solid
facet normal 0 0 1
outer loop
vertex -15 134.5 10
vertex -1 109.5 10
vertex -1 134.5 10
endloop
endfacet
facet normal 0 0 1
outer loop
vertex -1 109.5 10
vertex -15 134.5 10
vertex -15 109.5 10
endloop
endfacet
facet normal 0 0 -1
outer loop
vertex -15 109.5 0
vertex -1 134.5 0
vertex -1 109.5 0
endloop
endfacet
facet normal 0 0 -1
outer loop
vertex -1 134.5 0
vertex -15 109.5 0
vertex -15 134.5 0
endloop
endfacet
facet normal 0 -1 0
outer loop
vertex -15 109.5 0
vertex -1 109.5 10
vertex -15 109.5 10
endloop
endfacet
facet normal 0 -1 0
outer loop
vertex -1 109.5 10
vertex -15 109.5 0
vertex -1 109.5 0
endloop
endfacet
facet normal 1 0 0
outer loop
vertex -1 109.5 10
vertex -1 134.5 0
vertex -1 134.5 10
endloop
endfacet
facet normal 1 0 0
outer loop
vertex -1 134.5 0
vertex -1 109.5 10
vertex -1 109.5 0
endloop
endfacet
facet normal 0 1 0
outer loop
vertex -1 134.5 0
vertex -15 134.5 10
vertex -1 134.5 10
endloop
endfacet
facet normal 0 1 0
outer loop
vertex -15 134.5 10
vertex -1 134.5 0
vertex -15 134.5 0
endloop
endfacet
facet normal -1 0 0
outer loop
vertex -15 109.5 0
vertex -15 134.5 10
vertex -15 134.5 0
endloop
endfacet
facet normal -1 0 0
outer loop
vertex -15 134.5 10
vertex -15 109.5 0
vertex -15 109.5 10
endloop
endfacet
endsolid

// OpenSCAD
// file: hub.scad
module hub(hubDiameter,hubHeight,hubSetScewDiameter)
	{
		if(hubSetScewDiameter == 0)
		{
			cylinder(h = hubHeight, r = hubDiameter/2, center =false);
		}
		if(hubSetScewDiameter >= 0)
		{
			difference()
			{
				
				cylinder(h = hubHeight, r = hubDiameter/2, center =false);
				for(rotZ=[1:numSetScrews])
					rotate([0,0,360*(rotZ/numSetScrews)]) translate([0,0,hubHeight/2]) rotate([0,90,0]) union(){
						translate([0,0,hubDiameter/4]) teardrop(hubSetScewDiameter/2, hubDiameter/2+1,true);
						translate([-1,0,hubDiameter*9/32]) cube(size=[hubHeight/2+1+3.5,5.9,3],center=true);
					}
			}
		}
	};
// file: teardrop.scad
// From http://www.thingiverse.com/thing:3457
// © 2010 whosawhatsis

/*
This script generates a teardrop shape at the appropriate angle to prevent overhangs greater than 45 degrees. The angle is in degrees, and is a rotation around the Y axis. You can then rotate around Z to point it in any direction. Rotation around Y or Z will cause the angle to be wrong.
*/

module teardrop(radius, length, angle) {
rotate([0, angle, 0]) union() {
linear_extrude(height = length, center = true, convexity = radius, twist = 0)
circle(r = radius, center = true, $fn = 30);
linear_extrude(height = length, center = true, convexity = radius, twist = 0)
projection(cut = false) rotate([0, -angle, 0]) translate([0, 0, radius * sin(45) * 1.5]) cylinder(h = radius * sin(45), r1 = radius * sin(45), r2 = 0, center = true, $fn = 30);
}

//I worked this portion out when a bug was causing the projection above to take FOREVER to calculate. It works as a replacement, and I figured I'd leave it here just in case.
/*
#polygon(points = [[radius * cos(-angle / 2), radius * sin(-angle / 2), 0],[radius * cos(-angle / 2), radius * -sin(-angle / 2), 0],[(sin(-angle - 45) + cos(-angle - 45)) * radius, 0, 0]], paths = [[0, 1, 2]]);
#polygon(points = [[radius * -cos(-angle / 2), radius * sin(-angle / 2), 0],[radius * -cos(-angle / 2), radius * -sin(-angle / 2), 0],[(sin(-angle - 45) + cos(-angle - 45)) * radius, 0, 0]], paths = [[0, 1, 2]]);
#polygon(points = [[radius * sin(-angle / 2), radius * cos(-angle / 2), 0],[radius * sin(-angle / 2), radius * -cos(-angle / 2), 0],[(sin(-angle - 45) + cos(-angle - 45)) * radius, 0, 0]], paths = [[0, 1, 2]]);
*/
}

module test_teardrop(){
    translate([0, -15, 0]) teardrop(5, 20, 90);
    translate([0, 0, 0]) teardrop(5, 20, 60);
    translate([0, 15, 0]) teardrop(5, 20, 45);
}

//test_teardrop();
// main file
$fn=200;
include <parametric_involute_gear_v5.0_viertel.scad>;
include <teardrop.scad>;
include <hub.scad>;

shaftDiameter = 5; // the shaft at the center, will be subtracted from the pulley. Better be too small than too wide.
hubDiameter = 30; // if the hub or timing pulley is big enough to fit a nut, this will be embedded.
hubHeight = 12; // the hub is the thick cylinder connected to the pulley to allow a set screw to go through or as a collar for a nut.
flanges = 0; // the rims that keep the belt from going anywhere
hubSetScewDiameter = 3; // use either a set screw or nut on a shaft. Set to 0 to not use a set screw.
numSetScrews = 1;


*difference(){
  rotate([0,0,15]) union(){
    difference(){
        translate([0,0,-6]) gear (number_of_teeth=100,
          circular_pitch=500,
          gear_thickness = 6,
          rim_thickness = 6,
          hub_thickness = 6,
          circles=6);
        translate([0,0,-6]) cylinder(h=50, d=hubDiameter, center=T);
    }
    rotate([0,0,-15-90-45]) translate([0,0,-6]) hub(hubDiameter,hubHeight,hubSetScewDiameter);
  }
  *cylinder(d=shaftDiameter, h=50, center=true);
  difference(){
    cube([400,400,20], center=true);
    minkowski(){
      cylinder(d=30, h=20, center=true);
      translate([0,0,-10]) cube([400,400,20]);
    };
  };
  *cube([7.2,7.2,30], center=true);
  rotate([0,0,45/2]) cylinder(d = 8, h=50, $fn=8, center = true);
};
			
*#translate([122,-8,5]) cube([25,14, 10], center=true);
#translate([-8,122,5]) cube([14,25, 10], center=true);
